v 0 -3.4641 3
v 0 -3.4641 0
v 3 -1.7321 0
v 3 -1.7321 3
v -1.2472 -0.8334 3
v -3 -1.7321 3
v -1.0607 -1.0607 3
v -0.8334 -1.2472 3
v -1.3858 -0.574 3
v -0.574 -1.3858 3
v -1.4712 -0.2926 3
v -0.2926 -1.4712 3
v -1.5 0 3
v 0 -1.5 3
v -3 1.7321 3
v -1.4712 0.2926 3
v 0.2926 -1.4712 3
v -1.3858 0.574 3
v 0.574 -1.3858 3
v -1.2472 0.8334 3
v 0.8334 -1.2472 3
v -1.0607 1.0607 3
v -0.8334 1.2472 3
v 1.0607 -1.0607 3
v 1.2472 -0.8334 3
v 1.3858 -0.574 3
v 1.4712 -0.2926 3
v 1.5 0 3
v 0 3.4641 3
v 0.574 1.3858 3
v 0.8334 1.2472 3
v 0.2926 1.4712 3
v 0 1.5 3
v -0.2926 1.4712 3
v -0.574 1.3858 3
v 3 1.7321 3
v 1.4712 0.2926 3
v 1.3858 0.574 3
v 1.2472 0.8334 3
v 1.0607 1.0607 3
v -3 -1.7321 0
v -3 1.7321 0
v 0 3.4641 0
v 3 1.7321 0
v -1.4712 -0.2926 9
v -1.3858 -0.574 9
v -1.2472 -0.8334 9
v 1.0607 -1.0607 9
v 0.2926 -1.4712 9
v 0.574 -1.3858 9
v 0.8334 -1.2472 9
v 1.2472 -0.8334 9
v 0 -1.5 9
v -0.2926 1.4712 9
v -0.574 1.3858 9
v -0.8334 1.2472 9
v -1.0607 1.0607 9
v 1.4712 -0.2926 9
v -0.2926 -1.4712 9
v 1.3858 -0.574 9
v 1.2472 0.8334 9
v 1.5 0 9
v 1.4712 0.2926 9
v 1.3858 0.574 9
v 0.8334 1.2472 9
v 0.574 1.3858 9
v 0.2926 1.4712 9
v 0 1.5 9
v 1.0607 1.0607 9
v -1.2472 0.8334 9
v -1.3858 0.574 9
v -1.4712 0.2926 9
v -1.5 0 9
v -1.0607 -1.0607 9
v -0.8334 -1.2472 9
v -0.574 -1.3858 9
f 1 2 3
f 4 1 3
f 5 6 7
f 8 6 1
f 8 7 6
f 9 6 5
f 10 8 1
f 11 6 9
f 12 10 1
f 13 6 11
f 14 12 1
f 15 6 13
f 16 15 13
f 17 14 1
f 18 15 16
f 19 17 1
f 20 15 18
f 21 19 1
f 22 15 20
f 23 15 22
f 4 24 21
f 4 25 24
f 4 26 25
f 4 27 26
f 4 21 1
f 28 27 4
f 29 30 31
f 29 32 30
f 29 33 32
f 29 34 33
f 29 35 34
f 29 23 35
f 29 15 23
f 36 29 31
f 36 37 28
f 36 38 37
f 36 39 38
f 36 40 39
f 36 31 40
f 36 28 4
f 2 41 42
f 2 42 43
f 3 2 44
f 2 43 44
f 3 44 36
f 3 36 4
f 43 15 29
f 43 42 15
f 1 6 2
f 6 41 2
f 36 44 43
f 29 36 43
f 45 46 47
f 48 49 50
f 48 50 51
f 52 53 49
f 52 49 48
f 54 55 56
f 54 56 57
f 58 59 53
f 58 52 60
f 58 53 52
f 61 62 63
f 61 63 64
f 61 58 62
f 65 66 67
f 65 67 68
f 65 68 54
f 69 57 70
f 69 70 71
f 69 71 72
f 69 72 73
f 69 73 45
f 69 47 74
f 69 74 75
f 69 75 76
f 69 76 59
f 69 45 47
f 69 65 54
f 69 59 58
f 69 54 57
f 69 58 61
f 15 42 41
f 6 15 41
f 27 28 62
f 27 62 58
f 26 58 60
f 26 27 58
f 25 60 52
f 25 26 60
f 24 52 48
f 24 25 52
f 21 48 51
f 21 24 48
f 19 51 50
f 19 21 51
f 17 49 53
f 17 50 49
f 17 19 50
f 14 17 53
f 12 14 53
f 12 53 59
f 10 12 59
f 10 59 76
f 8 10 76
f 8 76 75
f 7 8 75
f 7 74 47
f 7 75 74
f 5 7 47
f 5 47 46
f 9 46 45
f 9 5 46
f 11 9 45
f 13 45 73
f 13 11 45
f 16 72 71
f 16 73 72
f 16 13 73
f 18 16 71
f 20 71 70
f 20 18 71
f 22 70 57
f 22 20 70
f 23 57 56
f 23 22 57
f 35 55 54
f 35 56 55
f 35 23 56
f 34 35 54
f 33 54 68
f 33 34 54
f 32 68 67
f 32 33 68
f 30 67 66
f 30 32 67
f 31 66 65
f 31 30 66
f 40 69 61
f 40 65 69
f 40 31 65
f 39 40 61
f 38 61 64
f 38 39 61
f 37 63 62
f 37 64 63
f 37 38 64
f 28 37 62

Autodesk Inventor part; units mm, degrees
ref_plane "YZ Plane" through (0, 0, 0) normal (1, 0, 0) x (0, 1, 0)
ref_plane "XZ Plane" through (0, 0, 0) normal (0, 1, 0) x (-1, 0, 0)
ref_plane "XY Plane" through (0, 0, 0) normal (0, 0, 1) x (1, 0, 0)
sketch "Sketch1" plane through (0, 0, 0) normal (0, 0, 1) x (1, 0, 0)
  line L0 (3, 1.7321) -> (3, -1.7321)
  line L1 (3, 1.7321) -> (0, 3.4641)
  line L2 (-3, 1.7321) -> (0, 3.4641)
  line L3 (0, -3.4641) -> (3, -1.7321)
  line L4 (-3, 1.7321) -> (-3, -1.7321)
  line L5 (-3, -1.7321) -> (0, -3.4641)
  point P0 (0, 0)
  point P1 (0, 0)
  point P2 (0, 0)
  point P3 (0, 0)
  point P4 (0, 0)
  point P5 (0, 0)
  dimension "d0" = 120
  dimension "d1" = 120
  dimension "d2" = 120
  dimension "d3" = 120
  dimension "d4" = 120
  dimension "d5" = 120
  dimension "d6" = 6
  dimension "d7" = 3
  dimension "d18" = 0
  dimension "d19" = 0
  dimension "d20" = 0
extrude "Extrusion1" add sketch "Sketch1" along normal blind 3
sketch "Sketch2" plane through (0, 0, 3) normal (0, 0, 1) x (1, 0, 0)
  circle A0 centre (0, 0) radius 1.5
  dimension "d10" = 3
extrude "Extrusion2" add sketch "Sketch2" along normal blind 6
thread "Thread2" size "M3x0.5" class "6g" standard "ANSI Metric M Profile" full length
properties part number "m3 bolt" material "Steel, Mild"
